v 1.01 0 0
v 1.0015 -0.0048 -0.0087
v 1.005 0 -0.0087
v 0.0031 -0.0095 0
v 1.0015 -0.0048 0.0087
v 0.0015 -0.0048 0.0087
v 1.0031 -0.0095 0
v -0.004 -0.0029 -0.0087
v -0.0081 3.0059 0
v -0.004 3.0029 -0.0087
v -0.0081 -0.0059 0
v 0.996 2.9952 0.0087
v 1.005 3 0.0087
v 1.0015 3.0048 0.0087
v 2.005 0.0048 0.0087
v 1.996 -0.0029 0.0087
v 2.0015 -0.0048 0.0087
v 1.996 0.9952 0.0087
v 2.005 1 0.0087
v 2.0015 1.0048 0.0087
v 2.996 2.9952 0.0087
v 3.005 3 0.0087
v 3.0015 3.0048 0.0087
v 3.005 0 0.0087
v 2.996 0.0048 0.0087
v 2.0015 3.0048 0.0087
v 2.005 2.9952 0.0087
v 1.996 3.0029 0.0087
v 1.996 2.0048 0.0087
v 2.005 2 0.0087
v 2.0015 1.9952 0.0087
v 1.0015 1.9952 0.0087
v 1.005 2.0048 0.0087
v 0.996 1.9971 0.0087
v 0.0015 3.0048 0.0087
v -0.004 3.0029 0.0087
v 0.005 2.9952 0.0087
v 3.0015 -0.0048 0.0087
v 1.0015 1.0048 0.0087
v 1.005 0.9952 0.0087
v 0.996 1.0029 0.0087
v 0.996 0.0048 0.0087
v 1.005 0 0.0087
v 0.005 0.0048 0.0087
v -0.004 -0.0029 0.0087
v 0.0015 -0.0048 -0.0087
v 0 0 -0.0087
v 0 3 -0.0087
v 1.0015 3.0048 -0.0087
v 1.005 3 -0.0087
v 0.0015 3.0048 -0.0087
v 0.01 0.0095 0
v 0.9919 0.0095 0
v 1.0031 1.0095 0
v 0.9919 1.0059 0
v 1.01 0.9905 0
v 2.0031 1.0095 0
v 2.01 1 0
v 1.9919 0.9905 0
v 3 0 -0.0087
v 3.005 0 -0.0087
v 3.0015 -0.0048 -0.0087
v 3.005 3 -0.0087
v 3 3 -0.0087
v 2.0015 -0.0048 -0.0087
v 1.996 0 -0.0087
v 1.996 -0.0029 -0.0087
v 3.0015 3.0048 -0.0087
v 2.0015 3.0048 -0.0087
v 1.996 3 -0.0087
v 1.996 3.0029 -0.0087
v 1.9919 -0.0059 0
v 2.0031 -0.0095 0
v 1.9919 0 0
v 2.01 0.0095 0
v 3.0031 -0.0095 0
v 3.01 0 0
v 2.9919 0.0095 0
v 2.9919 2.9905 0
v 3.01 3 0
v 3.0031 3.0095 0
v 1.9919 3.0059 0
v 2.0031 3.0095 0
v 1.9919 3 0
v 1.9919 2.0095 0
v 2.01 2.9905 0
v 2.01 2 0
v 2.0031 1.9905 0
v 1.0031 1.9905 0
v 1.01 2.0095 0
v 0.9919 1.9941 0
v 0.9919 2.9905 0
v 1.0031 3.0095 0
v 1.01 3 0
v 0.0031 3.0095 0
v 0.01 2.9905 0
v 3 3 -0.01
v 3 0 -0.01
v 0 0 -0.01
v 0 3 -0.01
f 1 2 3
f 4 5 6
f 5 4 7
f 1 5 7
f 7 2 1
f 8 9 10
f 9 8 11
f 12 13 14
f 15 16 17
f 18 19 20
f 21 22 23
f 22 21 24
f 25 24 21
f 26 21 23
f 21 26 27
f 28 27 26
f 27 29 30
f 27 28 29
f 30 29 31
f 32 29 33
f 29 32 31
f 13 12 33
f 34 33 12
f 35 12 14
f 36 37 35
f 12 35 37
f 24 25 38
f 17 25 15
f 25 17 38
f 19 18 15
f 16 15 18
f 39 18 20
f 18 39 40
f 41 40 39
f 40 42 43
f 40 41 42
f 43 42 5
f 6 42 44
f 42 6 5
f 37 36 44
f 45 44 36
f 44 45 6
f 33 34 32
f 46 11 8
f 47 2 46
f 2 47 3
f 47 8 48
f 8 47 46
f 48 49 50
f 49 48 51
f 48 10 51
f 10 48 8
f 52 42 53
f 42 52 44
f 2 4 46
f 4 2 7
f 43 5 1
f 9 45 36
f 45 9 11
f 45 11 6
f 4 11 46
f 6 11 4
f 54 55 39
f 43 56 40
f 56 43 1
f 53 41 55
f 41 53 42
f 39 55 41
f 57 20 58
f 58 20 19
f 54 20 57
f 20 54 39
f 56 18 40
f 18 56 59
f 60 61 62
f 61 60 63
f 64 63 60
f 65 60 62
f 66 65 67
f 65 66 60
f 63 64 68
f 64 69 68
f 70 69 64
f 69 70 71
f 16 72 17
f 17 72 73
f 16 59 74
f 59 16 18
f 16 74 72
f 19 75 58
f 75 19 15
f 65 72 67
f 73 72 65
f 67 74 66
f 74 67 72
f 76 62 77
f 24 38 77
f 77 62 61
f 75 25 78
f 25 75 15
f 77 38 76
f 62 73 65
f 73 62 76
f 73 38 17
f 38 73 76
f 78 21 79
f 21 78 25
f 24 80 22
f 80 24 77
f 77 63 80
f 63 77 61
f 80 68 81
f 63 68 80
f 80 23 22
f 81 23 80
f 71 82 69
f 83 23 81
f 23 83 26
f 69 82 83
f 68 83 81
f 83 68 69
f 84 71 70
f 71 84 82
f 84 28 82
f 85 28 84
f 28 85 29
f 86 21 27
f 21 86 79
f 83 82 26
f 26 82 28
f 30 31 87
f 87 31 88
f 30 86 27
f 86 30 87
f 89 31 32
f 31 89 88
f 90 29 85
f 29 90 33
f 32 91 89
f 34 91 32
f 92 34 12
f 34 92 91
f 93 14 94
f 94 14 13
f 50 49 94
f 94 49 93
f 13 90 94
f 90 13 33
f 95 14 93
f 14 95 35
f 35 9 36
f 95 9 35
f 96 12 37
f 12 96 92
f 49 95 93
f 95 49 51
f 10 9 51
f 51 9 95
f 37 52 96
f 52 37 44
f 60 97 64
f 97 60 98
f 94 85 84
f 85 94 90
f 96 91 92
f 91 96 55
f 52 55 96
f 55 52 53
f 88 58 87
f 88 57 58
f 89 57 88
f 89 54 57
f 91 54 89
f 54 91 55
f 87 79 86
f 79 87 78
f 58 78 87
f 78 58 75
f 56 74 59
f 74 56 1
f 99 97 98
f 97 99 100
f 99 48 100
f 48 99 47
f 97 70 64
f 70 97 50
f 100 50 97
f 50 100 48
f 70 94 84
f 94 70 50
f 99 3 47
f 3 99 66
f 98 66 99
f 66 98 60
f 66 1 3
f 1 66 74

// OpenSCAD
hull(){
    translate([0, 0]) sphere(0.01);
    translate([1, 0]) sphere(0.01);
}
hull(){
    translate([1, 0]) sphere(0.01);
    translate([1, 1]) sphere(0.01);
}
hull(){
    translate([1, 1]) sphere(0.01);
    translate([2, 1]) sphere(0.01);
}
hull(){
    translate([2, 1]) sphere(0.01);
    translate([2, 0]) sphere(0.01);
}
hull(){
    translate([2, 0]) sphere(0.01);
    translate([3, 0]) sphere(0.01);
}
hull(){
    translate([3, 0]) sphere(0.01);
    translate([3, 1]) sphere(0.01);
}
hull(){
    translate([3, 1]) sphere(0.01);
    translate([3, 2]) sphere(0.01);
}
hull(){
    translate([3, 2]) sphere(0.01);
    translate([3, 3]) sphere(0.01);
}
hull(){
    translate([3, 3]) sphere(0.01);
    translate([2, 3]) sphere(0.01);
}
hull(){
    translate([2, 3]) sphere(0.01);
    translate([2, 2]) sphere(0.01);
}
hull(){
    translate([2, 2]) sphere(0.01);
    translate([1, 2]) sphere(0.01);
}
hull(){
    translate([1, 2]) sphere(0.01);
    translate([1, 3]) sphere(0.01);
}
hull(){
    translate([1, 3]) sphere(0.01);
    translate([0, 3]) sphere(0.01);
}
hull(){
    translate([0, 3]) sphere(0.01);
    translate([0, 2]) sphere(0.01);
}
hull(){
    translate([0, 2]) sphere(0.01);
    translate([0, 1]) sphere(0.01);
}
hull(){
    translate([0, 1]) sphere(0.01);
    translate([0, 0]) sphere(0.01);
}
translate([0,0,-0.01]) color([0.1,0.1,0.1]) cube([3,3,0.01]);
